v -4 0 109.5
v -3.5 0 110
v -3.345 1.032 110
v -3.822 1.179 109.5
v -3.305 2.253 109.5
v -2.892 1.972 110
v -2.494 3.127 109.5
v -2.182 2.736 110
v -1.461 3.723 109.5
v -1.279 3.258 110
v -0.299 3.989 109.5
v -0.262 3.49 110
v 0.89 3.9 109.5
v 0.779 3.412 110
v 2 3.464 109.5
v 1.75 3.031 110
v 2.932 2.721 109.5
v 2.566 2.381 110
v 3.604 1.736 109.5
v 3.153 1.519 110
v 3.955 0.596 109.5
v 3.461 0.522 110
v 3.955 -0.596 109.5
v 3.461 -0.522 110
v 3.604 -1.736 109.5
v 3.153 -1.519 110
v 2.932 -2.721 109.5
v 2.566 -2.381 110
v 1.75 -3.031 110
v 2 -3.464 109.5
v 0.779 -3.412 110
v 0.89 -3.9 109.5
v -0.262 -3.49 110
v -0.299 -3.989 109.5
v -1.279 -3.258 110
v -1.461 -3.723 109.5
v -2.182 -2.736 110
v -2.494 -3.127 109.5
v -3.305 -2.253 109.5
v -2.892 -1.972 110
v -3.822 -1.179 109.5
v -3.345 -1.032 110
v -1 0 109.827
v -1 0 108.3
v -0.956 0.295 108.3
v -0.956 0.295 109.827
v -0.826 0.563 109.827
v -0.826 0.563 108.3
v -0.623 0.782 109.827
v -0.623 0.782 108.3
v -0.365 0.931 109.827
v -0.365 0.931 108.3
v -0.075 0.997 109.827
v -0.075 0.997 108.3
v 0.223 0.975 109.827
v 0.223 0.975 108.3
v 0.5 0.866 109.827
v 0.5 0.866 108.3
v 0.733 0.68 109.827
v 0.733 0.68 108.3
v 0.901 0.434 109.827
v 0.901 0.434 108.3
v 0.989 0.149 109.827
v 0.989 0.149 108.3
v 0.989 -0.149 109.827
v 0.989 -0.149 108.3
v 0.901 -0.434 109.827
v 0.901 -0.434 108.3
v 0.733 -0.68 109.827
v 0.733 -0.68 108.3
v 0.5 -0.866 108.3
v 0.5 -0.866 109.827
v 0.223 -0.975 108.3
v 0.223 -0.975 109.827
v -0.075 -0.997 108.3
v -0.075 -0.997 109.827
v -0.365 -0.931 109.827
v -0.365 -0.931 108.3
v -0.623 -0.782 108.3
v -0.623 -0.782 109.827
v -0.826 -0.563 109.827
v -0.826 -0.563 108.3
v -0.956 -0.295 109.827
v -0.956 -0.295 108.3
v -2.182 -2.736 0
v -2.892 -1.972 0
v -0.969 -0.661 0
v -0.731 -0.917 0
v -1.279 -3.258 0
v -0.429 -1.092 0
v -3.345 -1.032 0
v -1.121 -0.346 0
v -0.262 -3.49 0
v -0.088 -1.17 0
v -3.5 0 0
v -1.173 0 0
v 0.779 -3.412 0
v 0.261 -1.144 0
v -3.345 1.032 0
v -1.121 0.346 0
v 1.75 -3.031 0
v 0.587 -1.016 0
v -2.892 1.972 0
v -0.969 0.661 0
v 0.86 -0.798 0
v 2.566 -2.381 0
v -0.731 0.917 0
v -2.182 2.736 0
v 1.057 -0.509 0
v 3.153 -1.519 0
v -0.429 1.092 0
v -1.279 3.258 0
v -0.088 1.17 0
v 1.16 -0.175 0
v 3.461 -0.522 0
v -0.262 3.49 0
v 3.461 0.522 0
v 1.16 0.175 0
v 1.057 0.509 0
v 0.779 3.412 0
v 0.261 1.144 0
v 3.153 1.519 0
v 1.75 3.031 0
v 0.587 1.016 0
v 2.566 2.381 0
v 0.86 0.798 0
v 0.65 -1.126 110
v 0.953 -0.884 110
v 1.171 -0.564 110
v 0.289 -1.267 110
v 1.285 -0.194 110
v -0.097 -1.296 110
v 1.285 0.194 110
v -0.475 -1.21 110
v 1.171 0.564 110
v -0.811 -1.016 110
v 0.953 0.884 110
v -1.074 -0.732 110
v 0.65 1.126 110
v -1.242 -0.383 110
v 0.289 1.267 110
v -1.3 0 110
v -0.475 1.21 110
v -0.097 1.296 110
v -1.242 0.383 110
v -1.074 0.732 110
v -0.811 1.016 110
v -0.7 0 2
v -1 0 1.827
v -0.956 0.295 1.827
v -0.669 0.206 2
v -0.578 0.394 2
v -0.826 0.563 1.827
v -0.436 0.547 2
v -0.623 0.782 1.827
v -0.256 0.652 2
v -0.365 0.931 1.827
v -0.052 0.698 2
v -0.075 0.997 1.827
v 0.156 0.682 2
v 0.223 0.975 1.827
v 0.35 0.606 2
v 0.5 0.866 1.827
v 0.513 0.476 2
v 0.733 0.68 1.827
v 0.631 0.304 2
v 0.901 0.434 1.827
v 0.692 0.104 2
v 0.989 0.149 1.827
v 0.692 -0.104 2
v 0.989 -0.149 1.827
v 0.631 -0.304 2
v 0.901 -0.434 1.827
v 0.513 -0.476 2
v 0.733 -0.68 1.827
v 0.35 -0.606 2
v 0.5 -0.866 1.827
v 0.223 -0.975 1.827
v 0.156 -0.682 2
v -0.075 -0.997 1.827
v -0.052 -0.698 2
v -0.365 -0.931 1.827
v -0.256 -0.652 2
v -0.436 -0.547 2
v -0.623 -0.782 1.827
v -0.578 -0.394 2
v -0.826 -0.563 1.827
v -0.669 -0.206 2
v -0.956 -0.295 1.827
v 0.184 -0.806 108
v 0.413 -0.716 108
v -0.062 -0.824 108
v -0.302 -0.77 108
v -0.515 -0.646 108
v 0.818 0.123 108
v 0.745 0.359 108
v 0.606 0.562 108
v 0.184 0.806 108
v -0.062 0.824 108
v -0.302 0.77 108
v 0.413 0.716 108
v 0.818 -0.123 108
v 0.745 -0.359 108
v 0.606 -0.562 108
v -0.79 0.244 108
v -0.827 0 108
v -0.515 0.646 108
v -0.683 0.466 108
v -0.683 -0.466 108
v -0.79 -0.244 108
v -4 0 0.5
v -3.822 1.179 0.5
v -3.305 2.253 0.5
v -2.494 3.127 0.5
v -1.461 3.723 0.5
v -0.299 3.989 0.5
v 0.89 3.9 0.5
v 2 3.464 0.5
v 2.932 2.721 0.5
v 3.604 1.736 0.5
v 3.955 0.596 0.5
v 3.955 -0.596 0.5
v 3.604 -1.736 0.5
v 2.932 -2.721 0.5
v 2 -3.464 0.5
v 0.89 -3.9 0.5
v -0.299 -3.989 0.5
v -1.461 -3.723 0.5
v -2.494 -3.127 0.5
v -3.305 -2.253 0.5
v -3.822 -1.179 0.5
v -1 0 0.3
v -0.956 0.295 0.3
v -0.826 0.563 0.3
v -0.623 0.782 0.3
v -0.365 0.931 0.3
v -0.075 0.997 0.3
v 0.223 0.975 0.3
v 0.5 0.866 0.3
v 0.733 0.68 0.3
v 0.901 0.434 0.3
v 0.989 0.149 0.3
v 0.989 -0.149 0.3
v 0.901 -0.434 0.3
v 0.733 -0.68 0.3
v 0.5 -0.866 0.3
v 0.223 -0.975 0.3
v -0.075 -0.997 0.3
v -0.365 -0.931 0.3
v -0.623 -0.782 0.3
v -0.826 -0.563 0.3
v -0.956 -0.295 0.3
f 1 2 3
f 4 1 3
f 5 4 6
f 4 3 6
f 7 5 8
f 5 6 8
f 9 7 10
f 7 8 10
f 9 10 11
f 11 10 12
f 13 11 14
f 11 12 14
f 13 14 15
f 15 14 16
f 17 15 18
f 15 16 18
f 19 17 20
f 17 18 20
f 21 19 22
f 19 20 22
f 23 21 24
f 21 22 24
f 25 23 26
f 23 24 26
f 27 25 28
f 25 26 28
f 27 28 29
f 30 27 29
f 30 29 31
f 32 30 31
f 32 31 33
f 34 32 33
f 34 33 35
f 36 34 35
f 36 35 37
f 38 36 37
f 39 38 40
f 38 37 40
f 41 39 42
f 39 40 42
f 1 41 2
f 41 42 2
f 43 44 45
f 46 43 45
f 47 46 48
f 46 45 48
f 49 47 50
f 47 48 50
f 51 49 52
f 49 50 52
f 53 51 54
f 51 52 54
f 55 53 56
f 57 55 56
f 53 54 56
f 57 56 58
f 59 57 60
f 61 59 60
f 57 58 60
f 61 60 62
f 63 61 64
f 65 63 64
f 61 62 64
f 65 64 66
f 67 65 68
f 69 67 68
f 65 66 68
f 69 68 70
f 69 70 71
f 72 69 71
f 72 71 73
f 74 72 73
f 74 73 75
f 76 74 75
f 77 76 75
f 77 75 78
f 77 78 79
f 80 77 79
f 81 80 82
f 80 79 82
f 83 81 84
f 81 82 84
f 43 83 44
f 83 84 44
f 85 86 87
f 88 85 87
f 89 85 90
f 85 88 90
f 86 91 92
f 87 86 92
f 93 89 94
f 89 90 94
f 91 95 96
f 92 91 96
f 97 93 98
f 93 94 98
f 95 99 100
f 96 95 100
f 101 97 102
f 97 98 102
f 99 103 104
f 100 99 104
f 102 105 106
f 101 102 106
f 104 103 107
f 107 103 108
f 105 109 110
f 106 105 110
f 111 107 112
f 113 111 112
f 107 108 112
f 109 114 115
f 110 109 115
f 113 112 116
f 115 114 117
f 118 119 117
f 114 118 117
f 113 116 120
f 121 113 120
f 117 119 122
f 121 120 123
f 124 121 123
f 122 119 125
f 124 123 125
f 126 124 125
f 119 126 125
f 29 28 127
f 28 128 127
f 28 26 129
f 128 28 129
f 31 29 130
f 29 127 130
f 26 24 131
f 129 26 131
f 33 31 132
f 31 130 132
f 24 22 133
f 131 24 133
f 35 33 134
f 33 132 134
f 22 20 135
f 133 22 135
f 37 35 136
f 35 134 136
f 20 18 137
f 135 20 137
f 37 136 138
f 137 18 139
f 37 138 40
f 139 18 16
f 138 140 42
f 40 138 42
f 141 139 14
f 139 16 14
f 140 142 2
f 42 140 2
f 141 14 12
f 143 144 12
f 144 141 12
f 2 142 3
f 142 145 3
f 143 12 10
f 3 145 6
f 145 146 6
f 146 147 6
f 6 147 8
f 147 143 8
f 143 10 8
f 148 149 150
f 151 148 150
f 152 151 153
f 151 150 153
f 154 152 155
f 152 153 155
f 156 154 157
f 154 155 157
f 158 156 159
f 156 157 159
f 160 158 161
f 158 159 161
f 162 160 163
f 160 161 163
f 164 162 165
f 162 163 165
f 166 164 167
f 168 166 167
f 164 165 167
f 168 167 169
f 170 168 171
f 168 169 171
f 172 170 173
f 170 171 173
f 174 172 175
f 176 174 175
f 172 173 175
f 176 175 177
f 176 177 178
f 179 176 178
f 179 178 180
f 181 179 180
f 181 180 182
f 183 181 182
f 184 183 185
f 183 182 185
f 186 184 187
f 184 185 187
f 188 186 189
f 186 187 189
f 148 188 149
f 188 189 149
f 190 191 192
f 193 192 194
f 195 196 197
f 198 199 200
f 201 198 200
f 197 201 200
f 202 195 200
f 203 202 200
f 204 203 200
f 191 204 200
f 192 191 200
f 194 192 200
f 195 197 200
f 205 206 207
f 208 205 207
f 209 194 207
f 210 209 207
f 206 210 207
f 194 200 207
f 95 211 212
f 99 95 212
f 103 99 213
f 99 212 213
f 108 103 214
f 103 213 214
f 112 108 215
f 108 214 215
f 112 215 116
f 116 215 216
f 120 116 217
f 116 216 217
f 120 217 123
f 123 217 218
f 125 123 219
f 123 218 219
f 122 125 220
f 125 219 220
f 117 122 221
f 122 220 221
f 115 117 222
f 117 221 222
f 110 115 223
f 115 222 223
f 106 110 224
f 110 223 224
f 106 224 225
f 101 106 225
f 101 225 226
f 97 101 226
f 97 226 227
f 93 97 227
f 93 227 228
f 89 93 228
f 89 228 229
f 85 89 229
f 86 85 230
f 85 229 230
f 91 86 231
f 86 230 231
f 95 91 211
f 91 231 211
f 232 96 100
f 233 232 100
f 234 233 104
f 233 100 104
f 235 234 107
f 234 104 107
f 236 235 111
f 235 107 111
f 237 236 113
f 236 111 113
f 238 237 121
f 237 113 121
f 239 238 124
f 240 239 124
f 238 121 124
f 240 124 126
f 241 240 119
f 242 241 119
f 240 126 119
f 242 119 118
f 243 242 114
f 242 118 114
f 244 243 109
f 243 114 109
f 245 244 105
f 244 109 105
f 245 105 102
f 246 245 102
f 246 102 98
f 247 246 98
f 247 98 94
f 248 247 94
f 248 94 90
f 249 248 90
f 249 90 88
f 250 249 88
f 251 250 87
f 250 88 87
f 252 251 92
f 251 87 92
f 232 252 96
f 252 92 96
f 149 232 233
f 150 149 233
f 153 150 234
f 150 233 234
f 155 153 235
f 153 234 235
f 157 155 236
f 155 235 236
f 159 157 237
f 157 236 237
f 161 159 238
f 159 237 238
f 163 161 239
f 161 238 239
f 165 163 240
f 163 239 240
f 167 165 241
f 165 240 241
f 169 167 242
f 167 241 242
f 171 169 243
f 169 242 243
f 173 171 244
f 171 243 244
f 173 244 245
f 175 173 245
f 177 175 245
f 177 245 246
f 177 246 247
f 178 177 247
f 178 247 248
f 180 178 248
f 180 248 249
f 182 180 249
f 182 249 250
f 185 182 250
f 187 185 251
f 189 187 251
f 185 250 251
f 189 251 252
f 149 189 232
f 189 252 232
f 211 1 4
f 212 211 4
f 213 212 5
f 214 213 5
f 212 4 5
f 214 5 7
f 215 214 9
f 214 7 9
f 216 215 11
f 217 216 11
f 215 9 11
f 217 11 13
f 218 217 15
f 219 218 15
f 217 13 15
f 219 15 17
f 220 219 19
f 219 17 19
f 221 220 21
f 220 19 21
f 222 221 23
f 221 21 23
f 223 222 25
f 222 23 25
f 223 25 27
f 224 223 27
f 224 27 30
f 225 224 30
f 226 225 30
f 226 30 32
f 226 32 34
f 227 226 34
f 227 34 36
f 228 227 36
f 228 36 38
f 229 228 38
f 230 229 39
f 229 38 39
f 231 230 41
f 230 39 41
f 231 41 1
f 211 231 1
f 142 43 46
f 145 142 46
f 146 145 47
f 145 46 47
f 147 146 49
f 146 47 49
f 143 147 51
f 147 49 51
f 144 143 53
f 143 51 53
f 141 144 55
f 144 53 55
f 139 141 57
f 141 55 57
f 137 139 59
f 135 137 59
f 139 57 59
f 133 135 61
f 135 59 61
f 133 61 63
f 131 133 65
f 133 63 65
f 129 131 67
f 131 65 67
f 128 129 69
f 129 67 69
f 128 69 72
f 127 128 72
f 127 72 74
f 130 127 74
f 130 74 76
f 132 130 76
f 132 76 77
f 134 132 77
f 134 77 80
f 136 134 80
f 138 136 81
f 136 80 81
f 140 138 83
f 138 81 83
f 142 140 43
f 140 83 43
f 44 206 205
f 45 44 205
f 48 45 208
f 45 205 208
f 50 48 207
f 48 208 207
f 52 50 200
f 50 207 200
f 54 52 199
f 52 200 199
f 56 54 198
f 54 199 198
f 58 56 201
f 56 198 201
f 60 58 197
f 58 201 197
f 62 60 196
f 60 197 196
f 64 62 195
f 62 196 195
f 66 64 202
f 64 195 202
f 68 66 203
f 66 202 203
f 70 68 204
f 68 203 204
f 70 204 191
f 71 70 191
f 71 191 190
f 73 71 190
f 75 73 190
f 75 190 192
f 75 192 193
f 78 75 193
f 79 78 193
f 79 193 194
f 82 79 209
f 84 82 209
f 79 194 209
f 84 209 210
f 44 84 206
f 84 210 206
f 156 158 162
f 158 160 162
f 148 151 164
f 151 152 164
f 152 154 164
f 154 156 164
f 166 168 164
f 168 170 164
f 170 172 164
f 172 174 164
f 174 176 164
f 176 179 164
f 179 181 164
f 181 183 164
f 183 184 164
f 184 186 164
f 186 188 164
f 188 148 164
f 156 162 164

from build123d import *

# Parameters (mm, degrees)
CHAMFER1_SIZE         = 0.5
CHAMFER2_SIZE         = 0.3
CHAMFER2_SIZE2        = 0.173205081
CHAMFER2_PART_2_SIZE  = 0.3
CHAMFER2_PART_2_SIZE2 = 0.173205081
CHAMFER2_PART_3_SIZE  = 0.3
CHAMFER2_PART_3_SIZE2 = 0.173205081
CHAMFER2_PART_4_SIZE  = 0.3
CHAMFER2_PART_4_SIZE2 = 0.173205081


with BuildPart() as part:
    # Sketch1 → Revolve1 (revolve)
    with BuildSketch(Plane(origin=(0, 0, 0), x_dir=(1, 0, 0), z_dir=(0, 1, 0))):
        Polygon((-1, 0), (-4, 0), (-4, -110), (-1, -110), (-1, -108), (0, -108), (0, -2), (-1, -2), align=None)
    revolve(axis=Axis((0, 0, 108), (0, 0, -1)))

    # Chamfer1
    chamfer1_edges = [part.edges().sort_by_distance(p)[0] for p in [
        (4, 0, 110),
        (4, 0, 0),
    ]]
    chamfer(chamfer1_edges, length=CHAMFER1_SIZE)

    # Chamfer2
    chamfer2_edges = [part.edges().sort_by_distance(p)[0] for p in [
        (1, 0, 2),
    ]]
    chamfer2_side = [part.faces().sort_by_distance(p)[0] for p in [
        (0, 0, 2),
    ]]
    chamfer(chamfer2_edges, length=CHAMFER2_SIZE, length2=CHAMFER2_SIZE2, reference=chamfer2_side[0])

    # Chamfer2 part 2
    chamfer2_part_2_edges = [part.edges().sort_by_distance(p)[0] for p in [
        (1, 0, 108),
    ]]
    chamfer2_part_2_side = [part.faces().sort_by_distance(p)[0] for p in [
        (1, 0, 109),
    ]]
    chamfer(chamfer2_part_2_edges, length=CHAMFER2_PART_2_SIZE, length2=CHAMFER2_PART_2_SIZE2, reference=chamfer2_part_2_side[0])

    # Chamfer2 part 3
    chamfer2_part_3_edges = [part.edges().sort_by_distance(p)[0] for p in [
        (1, 0, 110),
    ]]
    chamfer2_part_3_side = [part.faces().sort_by_distance(p)[0] for p in [
        (3.401005051, 0, 110),
    ]]
    chamfer(chamfer2_part_3_edges, length=CHAMFER2_PART_3_SIZE, length2=CHAMFER2_PART_3_SIZE2, reference=chamfer2_part_3_side[0])

    # Chamfer2 part 4
    chamfer2_part_4_edges = [part.edges().sort_by_distance(p)[0] for p in [
        (1, 0, 0),
    ]]
    chamfer2_part_4_side = [part.faces().sort_by_distance(p)[0] for p in [
        (1, 0, 1),
    ]]
    chamfer(chamfer2_part_4_edges, length=CHAMFER2_PART_4_SIZE, length2=CHAMFER2_PART_4_SIZE2, reference=chamfer2_part_4_side[0])


solid = part.part
